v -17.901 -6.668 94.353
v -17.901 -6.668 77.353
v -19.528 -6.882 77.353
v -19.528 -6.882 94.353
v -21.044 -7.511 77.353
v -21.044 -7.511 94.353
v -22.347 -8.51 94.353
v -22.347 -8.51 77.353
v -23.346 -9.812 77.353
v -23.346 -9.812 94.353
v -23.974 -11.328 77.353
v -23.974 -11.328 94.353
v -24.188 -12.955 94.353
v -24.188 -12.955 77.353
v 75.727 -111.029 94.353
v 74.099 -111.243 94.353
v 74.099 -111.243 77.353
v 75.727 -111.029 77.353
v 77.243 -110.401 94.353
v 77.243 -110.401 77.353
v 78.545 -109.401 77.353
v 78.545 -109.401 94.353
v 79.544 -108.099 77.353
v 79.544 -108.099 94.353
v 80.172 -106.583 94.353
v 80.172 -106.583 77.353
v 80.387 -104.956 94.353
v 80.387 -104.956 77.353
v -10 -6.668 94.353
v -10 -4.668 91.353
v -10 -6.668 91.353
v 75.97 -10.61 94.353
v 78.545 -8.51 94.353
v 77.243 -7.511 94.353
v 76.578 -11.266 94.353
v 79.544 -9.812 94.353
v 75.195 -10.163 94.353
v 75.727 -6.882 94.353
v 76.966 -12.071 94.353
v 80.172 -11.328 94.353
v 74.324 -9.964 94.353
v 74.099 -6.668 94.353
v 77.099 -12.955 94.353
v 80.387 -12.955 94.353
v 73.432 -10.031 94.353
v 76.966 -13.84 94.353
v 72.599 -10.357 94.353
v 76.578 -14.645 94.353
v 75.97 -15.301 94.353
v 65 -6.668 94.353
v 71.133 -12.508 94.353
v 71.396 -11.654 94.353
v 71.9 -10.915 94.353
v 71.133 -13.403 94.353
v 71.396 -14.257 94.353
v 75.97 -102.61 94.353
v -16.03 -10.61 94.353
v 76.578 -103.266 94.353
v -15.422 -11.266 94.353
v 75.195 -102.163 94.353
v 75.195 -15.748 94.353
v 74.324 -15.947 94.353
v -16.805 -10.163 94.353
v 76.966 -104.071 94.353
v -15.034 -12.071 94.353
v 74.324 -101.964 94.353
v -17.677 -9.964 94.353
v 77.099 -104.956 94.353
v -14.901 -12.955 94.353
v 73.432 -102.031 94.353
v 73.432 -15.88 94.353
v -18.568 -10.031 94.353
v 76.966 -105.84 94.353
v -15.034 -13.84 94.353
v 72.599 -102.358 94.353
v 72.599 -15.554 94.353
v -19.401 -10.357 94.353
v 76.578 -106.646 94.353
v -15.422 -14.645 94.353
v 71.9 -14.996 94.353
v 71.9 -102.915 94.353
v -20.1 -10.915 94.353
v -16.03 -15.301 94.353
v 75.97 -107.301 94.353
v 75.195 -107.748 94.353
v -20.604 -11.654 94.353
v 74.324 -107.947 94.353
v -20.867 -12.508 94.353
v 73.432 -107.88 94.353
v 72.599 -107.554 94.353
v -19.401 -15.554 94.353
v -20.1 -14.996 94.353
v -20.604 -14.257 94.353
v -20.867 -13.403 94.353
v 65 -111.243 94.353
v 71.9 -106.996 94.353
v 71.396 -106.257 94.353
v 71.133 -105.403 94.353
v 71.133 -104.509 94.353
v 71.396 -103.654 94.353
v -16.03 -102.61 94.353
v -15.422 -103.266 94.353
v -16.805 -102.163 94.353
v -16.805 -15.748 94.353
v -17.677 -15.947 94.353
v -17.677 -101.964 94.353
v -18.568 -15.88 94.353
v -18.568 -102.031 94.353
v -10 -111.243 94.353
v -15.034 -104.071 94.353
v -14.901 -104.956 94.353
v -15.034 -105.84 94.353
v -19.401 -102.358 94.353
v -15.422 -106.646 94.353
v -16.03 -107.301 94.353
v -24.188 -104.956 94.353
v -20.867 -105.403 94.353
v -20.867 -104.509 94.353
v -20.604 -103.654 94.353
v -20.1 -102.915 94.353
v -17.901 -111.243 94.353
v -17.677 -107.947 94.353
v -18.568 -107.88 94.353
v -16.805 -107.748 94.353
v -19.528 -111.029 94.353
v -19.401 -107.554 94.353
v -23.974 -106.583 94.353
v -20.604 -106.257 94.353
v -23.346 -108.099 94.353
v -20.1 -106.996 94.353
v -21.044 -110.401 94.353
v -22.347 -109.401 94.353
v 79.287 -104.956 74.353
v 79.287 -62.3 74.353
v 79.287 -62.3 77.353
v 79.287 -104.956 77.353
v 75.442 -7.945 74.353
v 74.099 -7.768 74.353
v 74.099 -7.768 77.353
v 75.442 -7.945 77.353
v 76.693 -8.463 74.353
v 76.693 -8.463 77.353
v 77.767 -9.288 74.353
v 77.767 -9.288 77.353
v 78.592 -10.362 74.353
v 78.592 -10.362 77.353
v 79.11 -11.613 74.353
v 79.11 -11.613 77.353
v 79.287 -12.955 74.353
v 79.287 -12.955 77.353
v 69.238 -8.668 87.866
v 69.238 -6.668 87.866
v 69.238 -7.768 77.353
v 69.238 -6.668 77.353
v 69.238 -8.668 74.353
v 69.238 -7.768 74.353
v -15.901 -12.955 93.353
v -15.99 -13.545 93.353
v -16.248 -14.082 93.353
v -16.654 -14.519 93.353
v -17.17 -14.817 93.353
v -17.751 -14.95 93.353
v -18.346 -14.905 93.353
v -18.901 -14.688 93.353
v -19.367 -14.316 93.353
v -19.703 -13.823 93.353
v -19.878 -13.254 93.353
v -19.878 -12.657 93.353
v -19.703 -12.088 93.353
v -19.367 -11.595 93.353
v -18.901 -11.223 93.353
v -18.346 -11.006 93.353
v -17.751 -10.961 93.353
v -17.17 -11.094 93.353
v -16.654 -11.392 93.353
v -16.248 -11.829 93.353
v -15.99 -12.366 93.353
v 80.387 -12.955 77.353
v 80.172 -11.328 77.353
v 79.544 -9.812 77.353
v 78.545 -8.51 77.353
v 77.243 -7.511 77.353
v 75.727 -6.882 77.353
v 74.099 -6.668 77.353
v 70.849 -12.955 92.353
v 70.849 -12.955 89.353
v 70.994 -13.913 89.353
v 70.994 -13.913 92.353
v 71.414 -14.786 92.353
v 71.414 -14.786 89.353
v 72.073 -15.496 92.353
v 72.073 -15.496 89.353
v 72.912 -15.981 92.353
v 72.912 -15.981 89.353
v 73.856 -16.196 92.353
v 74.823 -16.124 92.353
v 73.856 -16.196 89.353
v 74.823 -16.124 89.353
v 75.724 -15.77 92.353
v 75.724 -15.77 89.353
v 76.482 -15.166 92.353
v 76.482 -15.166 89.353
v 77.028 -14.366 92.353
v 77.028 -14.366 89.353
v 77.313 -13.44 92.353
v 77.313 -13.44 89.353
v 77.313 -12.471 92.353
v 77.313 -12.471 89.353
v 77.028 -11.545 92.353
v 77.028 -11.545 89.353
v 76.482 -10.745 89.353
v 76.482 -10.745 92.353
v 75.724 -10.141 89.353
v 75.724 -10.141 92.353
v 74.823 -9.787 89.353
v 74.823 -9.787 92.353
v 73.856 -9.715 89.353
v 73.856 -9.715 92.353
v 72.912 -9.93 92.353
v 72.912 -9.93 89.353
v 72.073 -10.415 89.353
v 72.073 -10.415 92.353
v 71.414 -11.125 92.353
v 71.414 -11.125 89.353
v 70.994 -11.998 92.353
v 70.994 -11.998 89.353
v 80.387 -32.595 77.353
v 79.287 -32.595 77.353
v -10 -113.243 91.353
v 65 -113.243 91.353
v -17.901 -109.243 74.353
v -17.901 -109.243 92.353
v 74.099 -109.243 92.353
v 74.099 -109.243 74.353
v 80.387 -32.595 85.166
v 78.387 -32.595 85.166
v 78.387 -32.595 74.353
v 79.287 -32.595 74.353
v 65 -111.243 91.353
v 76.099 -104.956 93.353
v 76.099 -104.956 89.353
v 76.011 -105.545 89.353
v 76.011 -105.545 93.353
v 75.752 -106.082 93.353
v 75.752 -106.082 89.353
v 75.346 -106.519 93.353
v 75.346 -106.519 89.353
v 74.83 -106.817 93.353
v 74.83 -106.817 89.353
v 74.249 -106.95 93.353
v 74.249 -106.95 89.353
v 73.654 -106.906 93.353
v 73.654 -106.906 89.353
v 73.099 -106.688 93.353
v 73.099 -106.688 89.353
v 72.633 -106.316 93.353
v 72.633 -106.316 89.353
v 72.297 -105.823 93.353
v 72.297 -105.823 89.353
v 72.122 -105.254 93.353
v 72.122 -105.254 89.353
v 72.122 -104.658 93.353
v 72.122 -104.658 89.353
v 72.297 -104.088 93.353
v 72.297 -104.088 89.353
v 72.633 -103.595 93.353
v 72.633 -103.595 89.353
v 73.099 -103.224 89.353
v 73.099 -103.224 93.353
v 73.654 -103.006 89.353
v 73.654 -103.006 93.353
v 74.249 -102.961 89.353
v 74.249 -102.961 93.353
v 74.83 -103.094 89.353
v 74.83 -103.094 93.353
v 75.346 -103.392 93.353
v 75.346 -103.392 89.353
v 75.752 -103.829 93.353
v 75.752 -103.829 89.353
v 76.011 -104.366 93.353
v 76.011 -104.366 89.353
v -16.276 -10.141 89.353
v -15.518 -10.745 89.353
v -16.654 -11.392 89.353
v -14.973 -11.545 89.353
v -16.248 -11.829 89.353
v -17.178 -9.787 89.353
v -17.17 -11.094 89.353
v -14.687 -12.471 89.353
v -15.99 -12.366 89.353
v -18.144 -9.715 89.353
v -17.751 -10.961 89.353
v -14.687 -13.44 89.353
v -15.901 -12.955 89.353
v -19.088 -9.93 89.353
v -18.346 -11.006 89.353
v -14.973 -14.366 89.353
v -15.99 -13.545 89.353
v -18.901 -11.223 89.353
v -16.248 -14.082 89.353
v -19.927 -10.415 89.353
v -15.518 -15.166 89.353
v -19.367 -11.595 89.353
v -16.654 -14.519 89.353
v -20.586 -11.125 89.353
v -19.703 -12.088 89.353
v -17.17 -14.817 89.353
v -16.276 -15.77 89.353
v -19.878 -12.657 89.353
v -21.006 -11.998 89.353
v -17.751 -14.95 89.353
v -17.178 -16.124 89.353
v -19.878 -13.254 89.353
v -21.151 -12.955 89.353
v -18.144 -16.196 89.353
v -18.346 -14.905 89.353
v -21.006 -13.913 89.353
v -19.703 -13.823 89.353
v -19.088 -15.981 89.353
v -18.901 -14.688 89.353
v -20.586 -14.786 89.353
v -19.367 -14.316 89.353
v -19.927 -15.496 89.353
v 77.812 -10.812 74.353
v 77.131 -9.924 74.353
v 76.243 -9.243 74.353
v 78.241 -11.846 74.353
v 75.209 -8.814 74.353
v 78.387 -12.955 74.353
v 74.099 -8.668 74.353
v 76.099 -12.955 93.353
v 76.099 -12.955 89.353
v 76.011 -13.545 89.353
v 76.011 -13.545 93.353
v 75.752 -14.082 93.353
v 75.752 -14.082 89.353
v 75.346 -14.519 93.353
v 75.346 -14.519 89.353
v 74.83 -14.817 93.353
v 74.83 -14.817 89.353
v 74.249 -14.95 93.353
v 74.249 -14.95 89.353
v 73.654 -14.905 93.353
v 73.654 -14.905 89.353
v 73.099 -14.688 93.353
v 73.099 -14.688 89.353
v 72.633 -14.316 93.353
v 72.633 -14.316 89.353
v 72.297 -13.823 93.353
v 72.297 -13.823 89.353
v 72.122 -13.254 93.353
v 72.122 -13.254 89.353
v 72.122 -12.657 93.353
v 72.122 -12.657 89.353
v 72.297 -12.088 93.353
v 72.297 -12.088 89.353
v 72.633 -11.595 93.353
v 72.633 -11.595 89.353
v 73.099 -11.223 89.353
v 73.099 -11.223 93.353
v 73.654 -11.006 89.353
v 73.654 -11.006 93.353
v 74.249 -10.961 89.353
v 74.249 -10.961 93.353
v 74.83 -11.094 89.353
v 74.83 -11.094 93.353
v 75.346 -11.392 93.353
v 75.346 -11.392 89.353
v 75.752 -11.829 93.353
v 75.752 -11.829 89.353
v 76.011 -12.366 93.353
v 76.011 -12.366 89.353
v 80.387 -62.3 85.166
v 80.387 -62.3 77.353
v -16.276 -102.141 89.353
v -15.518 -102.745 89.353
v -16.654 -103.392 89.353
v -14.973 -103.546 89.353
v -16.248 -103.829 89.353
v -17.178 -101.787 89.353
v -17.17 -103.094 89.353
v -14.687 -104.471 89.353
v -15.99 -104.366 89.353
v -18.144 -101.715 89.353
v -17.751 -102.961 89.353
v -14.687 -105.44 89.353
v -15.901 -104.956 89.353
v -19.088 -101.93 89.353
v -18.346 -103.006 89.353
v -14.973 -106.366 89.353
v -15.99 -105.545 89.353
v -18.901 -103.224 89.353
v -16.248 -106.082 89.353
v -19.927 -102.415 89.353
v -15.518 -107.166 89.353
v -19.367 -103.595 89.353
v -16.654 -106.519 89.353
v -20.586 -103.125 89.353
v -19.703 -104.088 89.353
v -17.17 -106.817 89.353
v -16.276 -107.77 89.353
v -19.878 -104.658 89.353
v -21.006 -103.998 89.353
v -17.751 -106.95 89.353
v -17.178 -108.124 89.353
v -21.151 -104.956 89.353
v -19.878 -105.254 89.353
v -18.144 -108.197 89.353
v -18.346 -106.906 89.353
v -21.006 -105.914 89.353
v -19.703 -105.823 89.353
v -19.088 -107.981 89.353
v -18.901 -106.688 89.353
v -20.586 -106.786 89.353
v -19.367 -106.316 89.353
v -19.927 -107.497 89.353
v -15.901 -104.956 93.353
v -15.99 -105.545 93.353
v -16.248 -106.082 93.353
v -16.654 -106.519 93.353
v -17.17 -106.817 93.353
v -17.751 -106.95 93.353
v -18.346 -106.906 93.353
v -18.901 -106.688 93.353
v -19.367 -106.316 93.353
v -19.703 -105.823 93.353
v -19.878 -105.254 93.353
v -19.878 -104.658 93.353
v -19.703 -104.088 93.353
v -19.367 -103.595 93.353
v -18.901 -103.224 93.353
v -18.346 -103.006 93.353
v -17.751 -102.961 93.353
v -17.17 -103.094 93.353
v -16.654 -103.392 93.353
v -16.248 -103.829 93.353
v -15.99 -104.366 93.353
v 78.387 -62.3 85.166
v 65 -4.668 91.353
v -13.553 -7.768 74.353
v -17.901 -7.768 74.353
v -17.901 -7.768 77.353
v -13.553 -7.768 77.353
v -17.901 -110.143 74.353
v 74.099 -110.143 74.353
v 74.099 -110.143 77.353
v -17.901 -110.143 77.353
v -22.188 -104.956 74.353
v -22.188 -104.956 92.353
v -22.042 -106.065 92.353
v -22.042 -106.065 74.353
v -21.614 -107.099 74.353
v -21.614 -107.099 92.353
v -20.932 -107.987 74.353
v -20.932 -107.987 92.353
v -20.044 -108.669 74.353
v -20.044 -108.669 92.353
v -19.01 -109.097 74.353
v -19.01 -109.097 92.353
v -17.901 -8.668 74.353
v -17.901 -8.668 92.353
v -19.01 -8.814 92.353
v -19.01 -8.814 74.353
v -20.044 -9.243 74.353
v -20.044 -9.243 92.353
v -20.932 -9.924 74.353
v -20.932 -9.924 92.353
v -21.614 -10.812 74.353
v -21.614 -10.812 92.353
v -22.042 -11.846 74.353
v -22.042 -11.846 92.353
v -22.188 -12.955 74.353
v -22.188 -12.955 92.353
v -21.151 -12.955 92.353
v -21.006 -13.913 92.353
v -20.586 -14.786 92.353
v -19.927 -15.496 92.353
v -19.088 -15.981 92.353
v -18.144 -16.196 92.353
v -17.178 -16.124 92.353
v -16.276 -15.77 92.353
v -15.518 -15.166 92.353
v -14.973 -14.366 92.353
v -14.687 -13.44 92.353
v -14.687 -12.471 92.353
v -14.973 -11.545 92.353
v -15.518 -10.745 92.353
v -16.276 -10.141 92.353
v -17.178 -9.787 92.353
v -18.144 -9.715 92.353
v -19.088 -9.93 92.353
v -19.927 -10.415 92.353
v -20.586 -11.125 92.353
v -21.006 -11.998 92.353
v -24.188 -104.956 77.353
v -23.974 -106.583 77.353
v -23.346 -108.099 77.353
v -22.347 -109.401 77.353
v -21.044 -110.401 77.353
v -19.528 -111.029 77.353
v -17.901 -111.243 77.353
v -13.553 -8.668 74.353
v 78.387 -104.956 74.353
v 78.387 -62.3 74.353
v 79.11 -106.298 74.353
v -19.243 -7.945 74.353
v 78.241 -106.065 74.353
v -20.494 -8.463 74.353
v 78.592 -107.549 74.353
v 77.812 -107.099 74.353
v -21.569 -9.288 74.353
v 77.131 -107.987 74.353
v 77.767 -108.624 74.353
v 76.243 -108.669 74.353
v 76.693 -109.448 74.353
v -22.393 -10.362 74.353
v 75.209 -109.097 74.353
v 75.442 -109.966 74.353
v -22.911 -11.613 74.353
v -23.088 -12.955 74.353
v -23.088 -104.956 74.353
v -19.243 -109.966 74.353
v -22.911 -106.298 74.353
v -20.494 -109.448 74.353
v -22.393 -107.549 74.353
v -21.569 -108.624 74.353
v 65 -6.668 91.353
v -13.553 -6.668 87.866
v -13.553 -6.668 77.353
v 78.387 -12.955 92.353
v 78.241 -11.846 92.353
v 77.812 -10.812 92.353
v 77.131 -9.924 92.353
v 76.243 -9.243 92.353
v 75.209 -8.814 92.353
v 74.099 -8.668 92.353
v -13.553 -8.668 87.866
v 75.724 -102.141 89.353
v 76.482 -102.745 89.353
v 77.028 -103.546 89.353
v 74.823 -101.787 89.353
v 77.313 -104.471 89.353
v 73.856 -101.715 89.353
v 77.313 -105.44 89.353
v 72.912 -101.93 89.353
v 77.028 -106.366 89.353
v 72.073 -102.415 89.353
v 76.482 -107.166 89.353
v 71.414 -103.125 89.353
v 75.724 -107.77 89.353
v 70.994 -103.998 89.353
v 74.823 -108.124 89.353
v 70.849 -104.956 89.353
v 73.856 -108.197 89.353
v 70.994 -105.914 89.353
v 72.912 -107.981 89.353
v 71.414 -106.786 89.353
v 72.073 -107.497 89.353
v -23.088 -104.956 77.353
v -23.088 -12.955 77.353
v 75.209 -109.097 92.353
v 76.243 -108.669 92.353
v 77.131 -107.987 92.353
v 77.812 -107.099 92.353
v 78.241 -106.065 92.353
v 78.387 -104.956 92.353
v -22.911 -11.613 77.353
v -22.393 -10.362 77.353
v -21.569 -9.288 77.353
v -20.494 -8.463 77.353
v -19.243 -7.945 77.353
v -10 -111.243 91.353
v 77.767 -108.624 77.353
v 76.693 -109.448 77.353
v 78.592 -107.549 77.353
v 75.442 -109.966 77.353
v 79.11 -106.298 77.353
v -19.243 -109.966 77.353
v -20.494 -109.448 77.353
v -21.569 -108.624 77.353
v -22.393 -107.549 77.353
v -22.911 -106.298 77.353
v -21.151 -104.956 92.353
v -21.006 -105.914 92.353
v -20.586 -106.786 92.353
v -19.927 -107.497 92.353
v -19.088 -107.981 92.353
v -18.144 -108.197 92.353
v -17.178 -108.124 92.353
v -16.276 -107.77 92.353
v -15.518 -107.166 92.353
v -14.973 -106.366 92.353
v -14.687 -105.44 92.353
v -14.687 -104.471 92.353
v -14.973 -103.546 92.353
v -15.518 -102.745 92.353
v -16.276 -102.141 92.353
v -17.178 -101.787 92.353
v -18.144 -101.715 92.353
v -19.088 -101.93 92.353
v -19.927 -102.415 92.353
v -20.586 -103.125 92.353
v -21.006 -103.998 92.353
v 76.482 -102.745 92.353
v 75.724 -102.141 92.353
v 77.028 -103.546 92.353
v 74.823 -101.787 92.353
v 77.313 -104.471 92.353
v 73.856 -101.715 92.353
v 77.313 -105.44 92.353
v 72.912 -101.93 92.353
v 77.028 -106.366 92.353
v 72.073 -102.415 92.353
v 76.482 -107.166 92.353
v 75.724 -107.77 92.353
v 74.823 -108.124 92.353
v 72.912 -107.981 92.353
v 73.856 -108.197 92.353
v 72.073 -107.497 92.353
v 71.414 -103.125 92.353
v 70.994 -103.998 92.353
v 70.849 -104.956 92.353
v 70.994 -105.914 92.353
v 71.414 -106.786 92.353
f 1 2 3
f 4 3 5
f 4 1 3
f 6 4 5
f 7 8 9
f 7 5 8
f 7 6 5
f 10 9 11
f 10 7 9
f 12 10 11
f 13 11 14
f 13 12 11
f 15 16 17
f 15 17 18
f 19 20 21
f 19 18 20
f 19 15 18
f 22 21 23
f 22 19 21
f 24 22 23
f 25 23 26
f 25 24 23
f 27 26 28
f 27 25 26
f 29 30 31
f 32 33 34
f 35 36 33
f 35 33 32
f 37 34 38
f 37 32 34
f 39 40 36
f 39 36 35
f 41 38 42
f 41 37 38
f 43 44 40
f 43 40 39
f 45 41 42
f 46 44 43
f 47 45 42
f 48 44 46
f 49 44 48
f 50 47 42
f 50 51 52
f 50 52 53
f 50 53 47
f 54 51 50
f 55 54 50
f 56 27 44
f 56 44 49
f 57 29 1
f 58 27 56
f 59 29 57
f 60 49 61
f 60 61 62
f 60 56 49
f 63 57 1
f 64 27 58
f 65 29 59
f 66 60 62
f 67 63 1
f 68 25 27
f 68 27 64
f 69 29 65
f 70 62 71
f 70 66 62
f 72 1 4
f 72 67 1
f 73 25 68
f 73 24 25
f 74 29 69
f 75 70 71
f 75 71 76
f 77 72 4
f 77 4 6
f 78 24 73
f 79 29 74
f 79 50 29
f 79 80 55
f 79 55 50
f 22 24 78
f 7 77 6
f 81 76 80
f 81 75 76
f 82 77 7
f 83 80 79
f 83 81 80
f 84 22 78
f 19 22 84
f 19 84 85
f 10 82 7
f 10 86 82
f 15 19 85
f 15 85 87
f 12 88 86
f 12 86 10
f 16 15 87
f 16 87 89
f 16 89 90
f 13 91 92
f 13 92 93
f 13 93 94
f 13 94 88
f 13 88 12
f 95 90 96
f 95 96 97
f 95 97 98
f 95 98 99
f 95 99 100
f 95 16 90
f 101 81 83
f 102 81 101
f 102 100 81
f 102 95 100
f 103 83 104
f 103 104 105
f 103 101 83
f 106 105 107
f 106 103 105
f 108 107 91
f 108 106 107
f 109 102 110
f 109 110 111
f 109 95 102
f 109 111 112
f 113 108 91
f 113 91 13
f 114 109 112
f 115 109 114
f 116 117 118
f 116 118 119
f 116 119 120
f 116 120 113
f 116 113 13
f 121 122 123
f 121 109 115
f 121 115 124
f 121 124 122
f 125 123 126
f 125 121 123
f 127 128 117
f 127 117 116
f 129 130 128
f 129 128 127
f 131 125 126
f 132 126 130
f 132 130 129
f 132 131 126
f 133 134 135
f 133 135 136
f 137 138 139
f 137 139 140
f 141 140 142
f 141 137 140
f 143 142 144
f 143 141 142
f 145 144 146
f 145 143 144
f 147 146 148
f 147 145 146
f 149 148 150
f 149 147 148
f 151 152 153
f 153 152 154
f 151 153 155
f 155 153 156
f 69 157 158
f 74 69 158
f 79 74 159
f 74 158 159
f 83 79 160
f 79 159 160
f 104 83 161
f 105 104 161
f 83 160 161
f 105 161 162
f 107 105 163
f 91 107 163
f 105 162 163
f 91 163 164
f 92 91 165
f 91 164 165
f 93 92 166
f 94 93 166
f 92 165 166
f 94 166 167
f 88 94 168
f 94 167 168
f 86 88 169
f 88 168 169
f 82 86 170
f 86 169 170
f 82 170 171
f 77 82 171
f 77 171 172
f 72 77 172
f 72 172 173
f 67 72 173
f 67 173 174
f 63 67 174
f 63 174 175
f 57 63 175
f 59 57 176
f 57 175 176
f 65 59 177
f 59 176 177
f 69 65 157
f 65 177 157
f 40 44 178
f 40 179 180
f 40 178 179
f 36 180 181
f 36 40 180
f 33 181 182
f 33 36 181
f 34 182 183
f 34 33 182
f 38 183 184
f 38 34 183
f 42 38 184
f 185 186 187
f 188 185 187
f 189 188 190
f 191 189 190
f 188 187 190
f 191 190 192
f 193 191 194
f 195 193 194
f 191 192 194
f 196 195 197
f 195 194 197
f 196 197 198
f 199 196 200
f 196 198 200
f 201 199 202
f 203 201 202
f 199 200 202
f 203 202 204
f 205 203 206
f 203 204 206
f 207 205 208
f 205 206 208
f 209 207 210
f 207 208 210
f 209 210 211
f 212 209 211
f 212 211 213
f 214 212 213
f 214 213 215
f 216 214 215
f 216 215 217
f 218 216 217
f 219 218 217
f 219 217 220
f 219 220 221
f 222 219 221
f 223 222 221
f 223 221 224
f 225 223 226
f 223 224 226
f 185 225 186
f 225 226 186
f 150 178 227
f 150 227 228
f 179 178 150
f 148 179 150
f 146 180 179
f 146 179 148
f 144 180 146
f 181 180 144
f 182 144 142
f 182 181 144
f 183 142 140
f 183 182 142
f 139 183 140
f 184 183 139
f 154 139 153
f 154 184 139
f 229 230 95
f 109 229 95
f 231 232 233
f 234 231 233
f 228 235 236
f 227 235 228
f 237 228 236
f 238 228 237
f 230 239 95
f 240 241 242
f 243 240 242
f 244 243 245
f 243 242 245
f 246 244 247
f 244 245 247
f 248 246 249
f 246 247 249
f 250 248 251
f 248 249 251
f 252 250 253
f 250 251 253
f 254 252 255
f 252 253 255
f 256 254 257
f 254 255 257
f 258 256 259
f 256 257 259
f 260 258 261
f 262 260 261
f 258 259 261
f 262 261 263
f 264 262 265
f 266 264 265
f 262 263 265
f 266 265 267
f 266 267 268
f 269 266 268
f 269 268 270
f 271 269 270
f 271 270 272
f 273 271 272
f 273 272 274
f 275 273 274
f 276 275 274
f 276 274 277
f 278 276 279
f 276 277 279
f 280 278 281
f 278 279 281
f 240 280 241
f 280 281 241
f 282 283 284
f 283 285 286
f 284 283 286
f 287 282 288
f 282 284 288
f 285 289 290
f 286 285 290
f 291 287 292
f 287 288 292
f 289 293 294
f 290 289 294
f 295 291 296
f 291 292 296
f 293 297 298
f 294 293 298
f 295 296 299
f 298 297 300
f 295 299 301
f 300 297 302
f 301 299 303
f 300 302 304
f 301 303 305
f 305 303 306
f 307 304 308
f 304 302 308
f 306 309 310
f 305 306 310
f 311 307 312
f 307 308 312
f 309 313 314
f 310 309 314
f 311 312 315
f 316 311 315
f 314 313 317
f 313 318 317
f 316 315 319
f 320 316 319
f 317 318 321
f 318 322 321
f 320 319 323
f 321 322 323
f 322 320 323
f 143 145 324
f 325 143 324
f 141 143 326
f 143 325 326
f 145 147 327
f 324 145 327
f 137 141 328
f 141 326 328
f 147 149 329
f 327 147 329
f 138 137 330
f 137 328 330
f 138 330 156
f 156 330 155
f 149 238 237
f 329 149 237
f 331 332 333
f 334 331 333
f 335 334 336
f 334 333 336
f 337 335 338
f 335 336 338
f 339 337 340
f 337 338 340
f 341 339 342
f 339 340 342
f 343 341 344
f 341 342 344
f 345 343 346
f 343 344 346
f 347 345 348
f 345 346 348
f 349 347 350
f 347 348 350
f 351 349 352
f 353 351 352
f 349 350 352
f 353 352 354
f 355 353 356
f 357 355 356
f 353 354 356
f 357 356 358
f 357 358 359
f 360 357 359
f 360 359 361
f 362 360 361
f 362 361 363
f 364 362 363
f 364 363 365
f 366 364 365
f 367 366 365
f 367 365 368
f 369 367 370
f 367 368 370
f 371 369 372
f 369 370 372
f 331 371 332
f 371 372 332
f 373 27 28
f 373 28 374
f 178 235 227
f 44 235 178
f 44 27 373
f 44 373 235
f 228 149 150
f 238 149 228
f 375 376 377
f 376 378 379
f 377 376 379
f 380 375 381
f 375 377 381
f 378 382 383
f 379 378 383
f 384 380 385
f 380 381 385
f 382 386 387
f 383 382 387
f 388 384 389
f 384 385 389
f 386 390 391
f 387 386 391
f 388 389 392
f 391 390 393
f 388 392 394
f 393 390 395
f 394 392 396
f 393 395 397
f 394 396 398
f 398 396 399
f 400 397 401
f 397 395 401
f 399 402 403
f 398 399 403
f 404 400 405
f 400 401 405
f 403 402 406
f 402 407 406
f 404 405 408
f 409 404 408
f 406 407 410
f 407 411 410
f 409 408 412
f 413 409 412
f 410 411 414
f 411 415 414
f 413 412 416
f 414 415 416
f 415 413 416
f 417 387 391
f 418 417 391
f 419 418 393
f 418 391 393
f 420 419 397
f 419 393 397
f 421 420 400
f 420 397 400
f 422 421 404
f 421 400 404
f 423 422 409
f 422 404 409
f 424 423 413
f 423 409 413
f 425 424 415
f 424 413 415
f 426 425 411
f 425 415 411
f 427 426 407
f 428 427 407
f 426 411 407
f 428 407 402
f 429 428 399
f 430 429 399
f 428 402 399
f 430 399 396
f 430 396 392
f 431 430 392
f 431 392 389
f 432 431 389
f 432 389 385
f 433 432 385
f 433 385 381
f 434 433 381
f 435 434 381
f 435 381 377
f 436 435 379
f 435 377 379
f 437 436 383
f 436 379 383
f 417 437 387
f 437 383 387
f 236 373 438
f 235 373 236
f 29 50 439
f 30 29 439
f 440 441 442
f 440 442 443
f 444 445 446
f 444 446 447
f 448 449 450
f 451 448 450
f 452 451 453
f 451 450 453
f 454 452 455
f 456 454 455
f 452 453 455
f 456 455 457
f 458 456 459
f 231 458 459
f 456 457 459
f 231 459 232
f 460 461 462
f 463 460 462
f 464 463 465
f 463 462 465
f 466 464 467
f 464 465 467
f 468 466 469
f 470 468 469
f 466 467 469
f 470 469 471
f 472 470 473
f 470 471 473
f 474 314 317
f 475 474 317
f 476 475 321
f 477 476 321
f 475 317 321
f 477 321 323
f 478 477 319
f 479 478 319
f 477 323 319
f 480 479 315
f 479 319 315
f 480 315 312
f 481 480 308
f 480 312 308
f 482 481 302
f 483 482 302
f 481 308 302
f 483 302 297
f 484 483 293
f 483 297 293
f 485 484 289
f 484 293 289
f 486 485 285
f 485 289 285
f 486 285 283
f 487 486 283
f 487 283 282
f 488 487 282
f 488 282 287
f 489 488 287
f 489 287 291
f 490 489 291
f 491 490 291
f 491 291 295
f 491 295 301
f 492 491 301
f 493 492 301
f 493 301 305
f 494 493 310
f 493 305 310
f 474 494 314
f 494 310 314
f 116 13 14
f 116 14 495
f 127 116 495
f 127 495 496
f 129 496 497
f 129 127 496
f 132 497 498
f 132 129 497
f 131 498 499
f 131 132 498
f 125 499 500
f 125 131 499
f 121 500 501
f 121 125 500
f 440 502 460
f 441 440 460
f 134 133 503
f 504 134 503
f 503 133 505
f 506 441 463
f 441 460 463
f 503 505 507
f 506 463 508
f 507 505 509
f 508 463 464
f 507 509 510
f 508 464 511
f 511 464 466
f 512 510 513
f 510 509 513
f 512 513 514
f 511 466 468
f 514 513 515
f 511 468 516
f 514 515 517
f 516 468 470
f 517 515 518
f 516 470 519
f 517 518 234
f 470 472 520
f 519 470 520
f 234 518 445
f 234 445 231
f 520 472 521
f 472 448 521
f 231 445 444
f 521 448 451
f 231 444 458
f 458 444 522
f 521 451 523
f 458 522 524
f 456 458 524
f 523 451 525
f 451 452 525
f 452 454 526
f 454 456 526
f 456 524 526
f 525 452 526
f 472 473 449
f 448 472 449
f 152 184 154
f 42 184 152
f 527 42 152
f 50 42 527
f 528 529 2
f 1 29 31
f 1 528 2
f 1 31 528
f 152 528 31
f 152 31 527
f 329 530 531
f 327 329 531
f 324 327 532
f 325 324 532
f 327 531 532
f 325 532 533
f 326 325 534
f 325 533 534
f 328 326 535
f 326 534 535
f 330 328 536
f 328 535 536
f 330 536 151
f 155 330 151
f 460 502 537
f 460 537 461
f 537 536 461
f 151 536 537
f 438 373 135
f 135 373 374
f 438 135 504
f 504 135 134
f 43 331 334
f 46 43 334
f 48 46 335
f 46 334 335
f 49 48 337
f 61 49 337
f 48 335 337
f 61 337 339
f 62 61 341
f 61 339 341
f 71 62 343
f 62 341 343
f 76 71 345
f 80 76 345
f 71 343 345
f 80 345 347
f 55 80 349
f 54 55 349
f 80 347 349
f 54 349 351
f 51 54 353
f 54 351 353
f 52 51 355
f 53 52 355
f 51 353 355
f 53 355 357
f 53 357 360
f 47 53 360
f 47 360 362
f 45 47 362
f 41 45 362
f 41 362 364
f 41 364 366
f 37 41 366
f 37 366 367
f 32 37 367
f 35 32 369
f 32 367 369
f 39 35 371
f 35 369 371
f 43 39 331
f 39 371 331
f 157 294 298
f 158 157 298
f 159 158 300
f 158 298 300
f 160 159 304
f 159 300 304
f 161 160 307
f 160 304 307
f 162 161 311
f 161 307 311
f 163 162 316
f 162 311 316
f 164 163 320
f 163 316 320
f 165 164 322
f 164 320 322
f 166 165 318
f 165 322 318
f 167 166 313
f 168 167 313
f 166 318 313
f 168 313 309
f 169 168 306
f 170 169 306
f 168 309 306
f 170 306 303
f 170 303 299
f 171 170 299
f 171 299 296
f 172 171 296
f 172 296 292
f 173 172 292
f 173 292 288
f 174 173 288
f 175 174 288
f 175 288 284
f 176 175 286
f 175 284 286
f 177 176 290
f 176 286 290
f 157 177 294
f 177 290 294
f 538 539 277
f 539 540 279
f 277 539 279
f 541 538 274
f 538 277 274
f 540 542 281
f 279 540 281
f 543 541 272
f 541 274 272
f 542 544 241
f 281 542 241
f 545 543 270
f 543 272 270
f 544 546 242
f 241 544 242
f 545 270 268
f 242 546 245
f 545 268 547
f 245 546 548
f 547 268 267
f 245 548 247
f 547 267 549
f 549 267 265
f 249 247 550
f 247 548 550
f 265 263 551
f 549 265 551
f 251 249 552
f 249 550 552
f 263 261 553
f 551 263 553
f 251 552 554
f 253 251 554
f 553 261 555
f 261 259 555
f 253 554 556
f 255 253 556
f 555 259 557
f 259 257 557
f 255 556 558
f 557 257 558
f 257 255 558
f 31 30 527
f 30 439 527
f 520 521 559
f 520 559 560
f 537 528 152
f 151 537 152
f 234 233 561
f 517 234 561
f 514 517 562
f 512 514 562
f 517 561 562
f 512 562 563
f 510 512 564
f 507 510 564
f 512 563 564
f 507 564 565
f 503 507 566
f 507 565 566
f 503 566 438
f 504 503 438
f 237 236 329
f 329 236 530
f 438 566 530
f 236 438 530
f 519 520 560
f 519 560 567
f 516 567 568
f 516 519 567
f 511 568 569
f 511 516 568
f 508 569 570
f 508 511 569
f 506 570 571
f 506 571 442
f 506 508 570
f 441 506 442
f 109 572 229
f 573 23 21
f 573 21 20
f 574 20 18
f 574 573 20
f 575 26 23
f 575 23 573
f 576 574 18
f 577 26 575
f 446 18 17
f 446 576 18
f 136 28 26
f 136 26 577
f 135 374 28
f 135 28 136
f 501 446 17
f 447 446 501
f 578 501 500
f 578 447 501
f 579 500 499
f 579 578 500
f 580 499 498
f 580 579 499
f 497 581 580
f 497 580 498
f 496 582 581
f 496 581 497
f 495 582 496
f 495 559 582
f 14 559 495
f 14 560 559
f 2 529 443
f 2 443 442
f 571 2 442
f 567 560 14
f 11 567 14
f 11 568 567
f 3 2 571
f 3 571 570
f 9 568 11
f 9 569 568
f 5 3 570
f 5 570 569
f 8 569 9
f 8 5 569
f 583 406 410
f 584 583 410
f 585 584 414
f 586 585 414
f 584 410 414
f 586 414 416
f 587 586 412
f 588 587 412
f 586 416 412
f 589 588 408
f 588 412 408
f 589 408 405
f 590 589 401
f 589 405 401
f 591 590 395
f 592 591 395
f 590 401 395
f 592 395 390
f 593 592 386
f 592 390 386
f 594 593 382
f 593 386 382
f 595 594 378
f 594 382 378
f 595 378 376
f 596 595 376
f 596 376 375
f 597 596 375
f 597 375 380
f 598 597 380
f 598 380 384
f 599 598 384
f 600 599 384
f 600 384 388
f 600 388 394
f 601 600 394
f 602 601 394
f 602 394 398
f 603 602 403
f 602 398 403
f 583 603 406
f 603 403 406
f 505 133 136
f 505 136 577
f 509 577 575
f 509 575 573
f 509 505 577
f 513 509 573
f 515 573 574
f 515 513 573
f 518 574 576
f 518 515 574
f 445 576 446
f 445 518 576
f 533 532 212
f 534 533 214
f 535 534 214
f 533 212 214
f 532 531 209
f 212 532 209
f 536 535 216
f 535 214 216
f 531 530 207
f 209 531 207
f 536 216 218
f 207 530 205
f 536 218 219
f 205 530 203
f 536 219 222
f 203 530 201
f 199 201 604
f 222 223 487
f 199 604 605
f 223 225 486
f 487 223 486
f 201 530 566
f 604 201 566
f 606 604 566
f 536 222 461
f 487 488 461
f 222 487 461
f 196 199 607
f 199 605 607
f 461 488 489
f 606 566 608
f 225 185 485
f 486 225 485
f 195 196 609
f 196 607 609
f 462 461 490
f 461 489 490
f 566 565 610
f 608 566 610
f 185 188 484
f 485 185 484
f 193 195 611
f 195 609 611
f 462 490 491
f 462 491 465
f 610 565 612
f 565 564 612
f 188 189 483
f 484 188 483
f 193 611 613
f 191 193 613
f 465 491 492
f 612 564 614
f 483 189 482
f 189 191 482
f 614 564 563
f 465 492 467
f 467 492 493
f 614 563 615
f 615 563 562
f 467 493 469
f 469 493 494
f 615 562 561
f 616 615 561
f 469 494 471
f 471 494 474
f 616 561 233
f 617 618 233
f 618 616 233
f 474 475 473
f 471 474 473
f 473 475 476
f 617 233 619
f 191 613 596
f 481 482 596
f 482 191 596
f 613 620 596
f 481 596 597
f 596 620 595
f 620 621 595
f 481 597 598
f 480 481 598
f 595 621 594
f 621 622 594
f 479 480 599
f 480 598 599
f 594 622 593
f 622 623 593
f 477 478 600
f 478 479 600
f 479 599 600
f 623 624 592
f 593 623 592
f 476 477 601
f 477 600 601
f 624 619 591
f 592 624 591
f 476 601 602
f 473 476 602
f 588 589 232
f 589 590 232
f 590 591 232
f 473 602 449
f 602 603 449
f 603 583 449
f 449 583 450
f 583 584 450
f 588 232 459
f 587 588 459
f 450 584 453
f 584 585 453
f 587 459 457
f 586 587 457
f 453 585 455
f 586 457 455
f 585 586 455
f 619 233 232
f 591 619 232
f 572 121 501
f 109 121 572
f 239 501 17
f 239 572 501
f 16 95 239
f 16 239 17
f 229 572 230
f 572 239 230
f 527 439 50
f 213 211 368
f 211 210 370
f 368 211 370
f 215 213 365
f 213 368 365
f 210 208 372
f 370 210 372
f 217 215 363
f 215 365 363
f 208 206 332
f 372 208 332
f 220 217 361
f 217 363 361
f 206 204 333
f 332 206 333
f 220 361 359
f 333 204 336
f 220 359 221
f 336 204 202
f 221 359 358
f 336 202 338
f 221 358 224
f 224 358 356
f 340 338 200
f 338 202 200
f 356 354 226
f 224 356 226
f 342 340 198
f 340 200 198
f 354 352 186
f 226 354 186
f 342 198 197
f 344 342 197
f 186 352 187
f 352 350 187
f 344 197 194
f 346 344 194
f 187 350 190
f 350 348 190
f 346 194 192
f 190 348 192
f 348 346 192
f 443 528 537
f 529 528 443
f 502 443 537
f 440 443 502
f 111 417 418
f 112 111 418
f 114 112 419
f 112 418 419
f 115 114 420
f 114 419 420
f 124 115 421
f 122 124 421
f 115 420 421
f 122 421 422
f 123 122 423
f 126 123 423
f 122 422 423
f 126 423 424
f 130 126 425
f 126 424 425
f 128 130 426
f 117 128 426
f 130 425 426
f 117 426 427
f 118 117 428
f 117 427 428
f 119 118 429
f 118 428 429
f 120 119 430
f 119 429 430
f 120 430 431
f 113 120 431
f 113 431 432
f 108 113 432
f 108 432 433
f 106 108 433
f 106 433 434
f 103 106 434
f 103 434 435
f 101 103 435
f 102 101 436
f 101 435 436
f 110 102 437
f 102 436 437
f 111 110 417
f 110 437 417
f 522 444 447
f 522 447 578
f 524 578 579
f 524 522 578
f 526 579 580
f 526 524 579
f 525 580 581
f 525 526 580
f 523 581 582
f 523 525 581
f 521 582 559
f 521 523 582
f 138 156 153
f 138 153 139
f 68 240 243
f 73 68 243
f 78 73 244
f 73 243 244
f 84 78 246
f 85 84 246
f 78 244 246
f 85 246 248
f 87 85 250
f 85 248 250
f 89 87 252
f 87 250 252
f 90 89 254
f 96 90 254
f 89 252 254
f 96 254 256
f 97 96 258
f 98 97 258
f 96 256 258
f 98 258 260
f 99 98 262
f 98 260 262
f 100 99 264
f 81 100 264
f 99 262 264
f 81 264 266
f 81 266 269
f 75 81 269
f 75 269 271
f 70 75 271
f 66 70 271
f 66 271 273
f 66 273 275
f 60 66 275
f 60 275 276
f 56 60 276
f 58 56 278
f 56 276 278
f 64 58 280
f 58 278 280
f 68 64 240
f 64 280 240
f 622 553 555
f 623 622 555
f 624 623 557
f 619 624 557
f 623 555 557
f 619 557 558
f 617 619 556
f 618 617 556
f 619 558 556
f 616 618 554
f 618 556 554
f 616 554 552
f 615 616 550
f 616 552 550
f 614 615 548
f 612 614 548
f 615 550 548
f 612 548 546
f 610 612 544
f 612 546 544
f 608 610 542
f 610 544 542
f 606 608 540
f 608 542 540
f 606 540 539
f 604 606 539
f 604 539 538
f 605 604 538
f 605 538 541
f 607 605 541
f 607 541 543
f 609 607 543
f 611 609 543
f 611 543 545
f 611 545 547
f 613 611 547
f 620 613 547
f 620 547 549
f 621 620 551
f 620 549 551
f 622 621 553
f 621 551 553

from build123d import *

# Parameters (mm, degrees)
SKETCH1_R                = 3.25
BOSS_EXTRUDE1_DEPTH      = 3
BOSS_EXTRUDE1_2_DEPTH    = 3
BOSS_EXTRUDE1_3_DEPTH    = 3
BOSS_EXTRUDE1_4_DEPTH    = 3
BOSS_EXTRUDE2_DEPTH      = 2
BOSS_EXTRUDE3_DEPTH      = 20
SKETCH4_R                = 2
CUT_EXTRUDE1_DEPTH       = 5
CUT_EXTRUDE2_REACH       = 106.575
SKETCH6_W                = 82.790515713
SKETCH6_H                = 14.032058418
CUT_EXTRUDE3_REACH       = 106.575
SKETCH7_W                = 17
SKETCH7_H                = 29.705346692
CHAMFER1_SIZE            = 1
CUT_EXTRUDE4_DEPTH       = 3
BOSS_EXTRUDE4_DEPTH      = 65
BOSS_EXTRUDE4_DEPTH_BACK = 10


with BuildPart() as part:
    # Sketch1 → Boss-Extrude1 (new body)
    with BuildSketch(Plane(origin=(0, 0, 89.352648697), x_dir=(-1, 0, 0), z_dir=(0, 0, 1))):
        with Locations((-74.099367844, 104.955675546)):
            Circle(SKETCH1_R)
    extrude(amount=BOSS_EXTRUDE1_DEPTH)



with BuildPart() as body_2:
    # Sketch1 → Boss-Extrude1 2 (new body)
    with BuildSketch(Plane(origin=(0, 0, 89.352648697), x_dir=(-1, 0, 0), z_dir=(0, 0, 1))):
        with Locations((17.900817576, 104.955675546)):
            Circle(SKETCH1_R)
    extrude(amount=BOSS_EXTRUDE1_2_DEPTH)


with BuildPart() as body_3:
    # Sketch1 → Boss-Extrude1 3 (new body)
    with BuildSketch(Plane(origin=(0, 0, 89.352648697), x_dir=(-1, 0, 0), z_dir=(0, 0, 1))):
        with Locations((17.900817576, 12.955490126)):
            Circle(SKETCH1_R)
    extrude(amount=BOSS_EXTRUDE1_3_DEPTH)


with BuildPart() as body_4:
    # Sketch1 → Boss-Extrude1 4 (new body)
    with BuildSketch(Plane(origin=(0, 0, 89.352648697), x_dir=(-1, 0, 0), z_dir=(0, 0, 1))):
        with Locations((-74.099367844, 12.955490126)):
            Circle(SKETCH1_R)
    extrude(amount=BOSS_EXTRUDE1_4_DEPTH)


with BuildPart() as part_1:
    add(part.part)

    add(body_2.part)  # Boss-Extrude2 merges body 2

    add(body_3.part)  # Boss-Extrude2 merges body 3

    add(body_4.part)  # Boss-Extrude2 merges body 4
    # Sketch2 → Boss-Extrude2 (add)
    with BuildSketch(Plane(origin=(0, 0, 92.352648697), x_dir=(-1, 0, 0), z_dir=(0, 0, 1))):
        with BuildLine():
            Line((17.900817576, 109.242983141), (-74.099367844, 109.242983141))
            ThreePointArc((-74.099367844, 109.242983141), (-77.130952117, 107.987259819), (-78.386675439, 104.955675546))
            Line((-78.386675439, 104.955675546), (-78.386675439, 12.955490126))
            ThreePointArc((-78.386675439, 12.955490126), (-77.130952117, 9.923905853), (-74.099367844, 8.668182531))
            Line((-74.099367844, 8.668182531), (17.900817576, 8.668182531))
            ThreePointArc((17.900817576, 8.668182531), (20.93240185, 9.923905853), (22.188125171, 12.955490126))
            Line((22.188125171, 12.955490126), (22.188125171, 104.955675546))
            ThreePointArc((22.188125171, 104.955675546), (20.93240185, 107.987259819), (17.900817576, 109.242983141))
        make_face()
    extrude(amount=BOSS_EXTRUDE2_DEPTH)

    # Sketch3 → Boss-Extrude3 (add)
    with BuildSketch(Plane(origin=(0, 0, 94.352648697), x_dir=(-1, 0, 0), z_dir=(0, 0, 1))):
        with BuildLine():
            Line((17.900817576, 111.242983141), (-74.099367844, 111.242983141))
            ThreePointArc((-74.099367844, 111.242983141), (-78.54516568, 109.401473382), (-80.386675439, 104.955675546))
            Line((-80.386675439, 104.955675546), (-80.386675439, 12.955490126))
            ThreePointArc((-80.386675439, 12.955490126), (-78.54516568, 8.50969229), (-74.099367844, 6.668182531))
            Line((-74.099367844, 6.668182531), (17.900817576, 6.668182531))
            ThreePointArc((17.900817576, 6.668182531), (22.346615412, 8.50969229), (24.188125171, 12.955490126))
            Line((24.188125171, 12.955490126), (24.188125171, 104.955675546))
            ThreePointArc((24.188125171, 104.955675546), (22.346615412, 109.401473382), (17.900817576, 111.242983141))
        make_face()
        with BuildLine():
            Line((17.900817576, 109.242983141), (-74.099367844, 109.242983141))
            ThreePointArc((-74.099367844, 109.242983141), (-77.130952117, 107.987259819), (-78.386675439, 104.955675546))
            Line((-78.386675439, 104.955675546), (-78.386675439, 12.955490126))
            ThreePointArc((-78.386675439, 12.955490126), (-77.130952117, 9.923905853), (-74.099367844, 8.668182531))
            Line((-74.099367844, 8.668182531), (17.900817576, 8.668182531))
            ThreePointArc((17.900817576, 8.668182531), (20.93240185, 9.923905853), (22.188125171, 12.955490126))
            Line((22.188125171, 12.955490126), (22.188125171, 104.955675546))
            ThreePointArc((22.188125171, 104.955675546), (20.93240185, 107.987259819), (17.900817576, 109.242983141))
        make_face(mode=Mode.SUBTRACT)
    extrude(amount=-BOSS_EXTRUDE3_DEPTH)

    # Sketch4 → Cut-Extrude1 (cut)
    with BuildSketch(Plane(origin=(0, 0, 89.352648697), x_dir=(1, 0, 0), z_dir=(0, 0, -1))):
        with Locations((-17.900817576, 104.955675546)):
            Circle(SKETCH4_R)
        with Locations((74.099367844, 104.955675546)):
            Circle(SKETCH4_R)
        with Locations((74.099367844, 12.955490126)):
            Circle(SKETCH4_R)
        with Locations((-17.900817576, 12.955490126)):
            Circle(SKETCH4_R)
    extrude(amount=-CUT_EXTRUDE1_DEPTH, mode=Mode.SUBTRACT)

    # Sketch6 → Cut-Extrude2 (cut, up to next)
    with BuildSketch(Plane(origin=(0, -6.668182531, 0), x_dir=(1, 0, 0), z_dir=(0, 1, 0)), mode=Mode.PRIVATE) as cut_extrude2_sk1:
        with Locations((27.842461798, -80.850462516)):
            Rectangle(SKETCH6_W, SKETCH6_H)
    cut_extrude2_tool1 = extrude(cut_extrude2_sk1.sketch, amount=-CUT_EXTRUDE2_REACH, mode=Mode.PRIVATE) & part_1.part
    add(cut_extrude2_tool1.solids().sort_by_distance((27.842462, -6.668183, 80.850463))[0], mode=Mode.SUBTRACT)

    # Sketch7 → Cut-Extrude3 (cut, up to next)
    with BuildSketch(Plane(origin=(80.386675439, 0, 0), x_dir=(0, 0, -1), z_dir=(1, 0, 0)), mode=Mode.PRIVATE) as cut_extrude3_sk1:
        with Locations((-76.666440925, -47.447220968)):
            Rectangle(SKETCH7_W, SKETCH7_H)
    cut_extrude3_tool1 = extrude(cut_extrude3_sk1.sketch, amount=-CUT_EXTRUDE3_REACH, mode=Mode.PRIVATE) & part_1.part
    add(cut_extrude3_tool1.solids().sort_by_distance((80.386675, -47.447221, 76.666441))[0], mode=Mode.SUBTRACT)

    # Chamfer1
    chamfer1_edges = [part_1.edges().sort_by_distance(p)[0] for p in [
        (-19.900817576, -12.955490126, 94.352648697),
        (72.099367844, -12.955490126, 94.352648697),
        (72.099367844, -104.955675546, 94.352648697),
        (-19.900817576, -104.955675546, 94.352648697),
    ]]
    chamfer(chamfer1_edges, length=CHAMFER1_SIZE)

    # Sketch10 → Cut-Extrude4 (cut)
    with BuildSketch(Plane(origin=(0, 0, 74.352648697), x_dir=(-1, 0, 0), z_dir=(0, 0, -1))):
        with BuildLine():
            Line((-80.386675439, -12.955490126), (-80.386675439, -32.594547622))
            Line((-80.386675439, -32.594547622), (-80.386675439, -62.299894314))
            Line((-80.386675439, -62.299894314), (-80.386675439, -104.955675546))
            ThreePointArc((-80.386675439, -104.955675546), (-78.54516568, -109.401473382), (-74.099367844, -111.242983141))
            Line((-74.099367844, -111.242983141), (17.900817576, -111.242983141))
            ThreePointArc((17.900817576, -111.242983141), (22.346615412, -109.401473382), (24.188125171, -104.955675546))
            Line((24.188125171, -104.955675546), (24.188125171, -12.955490126))
            ThreePointArc((24.188125171, -12.955490126), (22.346615412, -8.50969229), (17.900817576, -6.668182531))
            Line((17.900817576, -6.668182531), (13.552796059, -6.668182531))
            Line((13.552796059, -6.668182531), (-69.237719654, -6.668182531))
            Line((-69.237719654, -6.668182531), (-74.099367844, -6.668182531))
            ThreePointArc((-74.099367844, -6.668182531), (-78.54516568, -8.50969229), (-80.386675439, -12.955490126))
        make_face()
        with BuildLine():
            Line((-79.286675439, -32.594547622), (-79.286675439, -62.299894314))
            Line((-79.286675439, -62.299894314), (-79.286675439, -104.955675546))
            ThreePointArc((-79.286675439, -104.955675546), (-77.76734822, -108.623655922), (-74.099367844, -110.142983141))
            Line((-74.099367844, -110.142983141), (17.900817576, -110.142983141))
            ThreePointArc((17.900817576, -110.142983141), (21.568797953, -108.623655922), (23.088125171, -104.955675546))
            Line((23.088125171, -104.955675546), (23.088125171, -12.955490126))
            ThreePointArc((23.088125171, -12.955490126), (21.568797953, -9.28750975), (17.900817576, -7.768182531))
            Line((17.900817576, -7.768182531), (13.552796059, -7.768182531))
            Line((13.552796059, -7.768182531), (-69.237719654, -7.768182531))
            Line((-69.237719654, -7.768182531), (-74.099367844, -7.768182531))
            ThreePointArc((-74.099367844, -7.768182531), (-77.76734822, -9.28750975), (-79.286675439, -12.955490126))
            Line((-79.286675439, -12.955490126), (-79.286675439, -32.594547622))
        make_face(mode=Mode.SUBTRACT)
    extrude(amount=-CUT_EXTRUDE4_DEPTH, mode=Mode.SUBTRACT)

    # Sketch11 → Boss-Extrude4 (add, two sides)
    with BuildSketch(Plane(origin=(0, 0, 0), x_dir=(0, 0, -1), z_dir=(1, 0, 0))) as boss_extrude4_sk:
        Polygon((-94.352648697, -6.668182531), (-91.352648697, -4.668182531), (-91.352648697, -6.668182531), align=None)
        Polygon((-94.352648697, -111.242983141), (-91.352648697, -111.242983141), (-91.352648697, -113.242983141), align=None)
    extrude(amount=BOSS_EXTRUDE4_DEPTH)
    extrude(boss_extrude4_sk.sketch, amount=-BOSS_EXTRUDE4_DEPTH_BACK)


solid = part_1.part
